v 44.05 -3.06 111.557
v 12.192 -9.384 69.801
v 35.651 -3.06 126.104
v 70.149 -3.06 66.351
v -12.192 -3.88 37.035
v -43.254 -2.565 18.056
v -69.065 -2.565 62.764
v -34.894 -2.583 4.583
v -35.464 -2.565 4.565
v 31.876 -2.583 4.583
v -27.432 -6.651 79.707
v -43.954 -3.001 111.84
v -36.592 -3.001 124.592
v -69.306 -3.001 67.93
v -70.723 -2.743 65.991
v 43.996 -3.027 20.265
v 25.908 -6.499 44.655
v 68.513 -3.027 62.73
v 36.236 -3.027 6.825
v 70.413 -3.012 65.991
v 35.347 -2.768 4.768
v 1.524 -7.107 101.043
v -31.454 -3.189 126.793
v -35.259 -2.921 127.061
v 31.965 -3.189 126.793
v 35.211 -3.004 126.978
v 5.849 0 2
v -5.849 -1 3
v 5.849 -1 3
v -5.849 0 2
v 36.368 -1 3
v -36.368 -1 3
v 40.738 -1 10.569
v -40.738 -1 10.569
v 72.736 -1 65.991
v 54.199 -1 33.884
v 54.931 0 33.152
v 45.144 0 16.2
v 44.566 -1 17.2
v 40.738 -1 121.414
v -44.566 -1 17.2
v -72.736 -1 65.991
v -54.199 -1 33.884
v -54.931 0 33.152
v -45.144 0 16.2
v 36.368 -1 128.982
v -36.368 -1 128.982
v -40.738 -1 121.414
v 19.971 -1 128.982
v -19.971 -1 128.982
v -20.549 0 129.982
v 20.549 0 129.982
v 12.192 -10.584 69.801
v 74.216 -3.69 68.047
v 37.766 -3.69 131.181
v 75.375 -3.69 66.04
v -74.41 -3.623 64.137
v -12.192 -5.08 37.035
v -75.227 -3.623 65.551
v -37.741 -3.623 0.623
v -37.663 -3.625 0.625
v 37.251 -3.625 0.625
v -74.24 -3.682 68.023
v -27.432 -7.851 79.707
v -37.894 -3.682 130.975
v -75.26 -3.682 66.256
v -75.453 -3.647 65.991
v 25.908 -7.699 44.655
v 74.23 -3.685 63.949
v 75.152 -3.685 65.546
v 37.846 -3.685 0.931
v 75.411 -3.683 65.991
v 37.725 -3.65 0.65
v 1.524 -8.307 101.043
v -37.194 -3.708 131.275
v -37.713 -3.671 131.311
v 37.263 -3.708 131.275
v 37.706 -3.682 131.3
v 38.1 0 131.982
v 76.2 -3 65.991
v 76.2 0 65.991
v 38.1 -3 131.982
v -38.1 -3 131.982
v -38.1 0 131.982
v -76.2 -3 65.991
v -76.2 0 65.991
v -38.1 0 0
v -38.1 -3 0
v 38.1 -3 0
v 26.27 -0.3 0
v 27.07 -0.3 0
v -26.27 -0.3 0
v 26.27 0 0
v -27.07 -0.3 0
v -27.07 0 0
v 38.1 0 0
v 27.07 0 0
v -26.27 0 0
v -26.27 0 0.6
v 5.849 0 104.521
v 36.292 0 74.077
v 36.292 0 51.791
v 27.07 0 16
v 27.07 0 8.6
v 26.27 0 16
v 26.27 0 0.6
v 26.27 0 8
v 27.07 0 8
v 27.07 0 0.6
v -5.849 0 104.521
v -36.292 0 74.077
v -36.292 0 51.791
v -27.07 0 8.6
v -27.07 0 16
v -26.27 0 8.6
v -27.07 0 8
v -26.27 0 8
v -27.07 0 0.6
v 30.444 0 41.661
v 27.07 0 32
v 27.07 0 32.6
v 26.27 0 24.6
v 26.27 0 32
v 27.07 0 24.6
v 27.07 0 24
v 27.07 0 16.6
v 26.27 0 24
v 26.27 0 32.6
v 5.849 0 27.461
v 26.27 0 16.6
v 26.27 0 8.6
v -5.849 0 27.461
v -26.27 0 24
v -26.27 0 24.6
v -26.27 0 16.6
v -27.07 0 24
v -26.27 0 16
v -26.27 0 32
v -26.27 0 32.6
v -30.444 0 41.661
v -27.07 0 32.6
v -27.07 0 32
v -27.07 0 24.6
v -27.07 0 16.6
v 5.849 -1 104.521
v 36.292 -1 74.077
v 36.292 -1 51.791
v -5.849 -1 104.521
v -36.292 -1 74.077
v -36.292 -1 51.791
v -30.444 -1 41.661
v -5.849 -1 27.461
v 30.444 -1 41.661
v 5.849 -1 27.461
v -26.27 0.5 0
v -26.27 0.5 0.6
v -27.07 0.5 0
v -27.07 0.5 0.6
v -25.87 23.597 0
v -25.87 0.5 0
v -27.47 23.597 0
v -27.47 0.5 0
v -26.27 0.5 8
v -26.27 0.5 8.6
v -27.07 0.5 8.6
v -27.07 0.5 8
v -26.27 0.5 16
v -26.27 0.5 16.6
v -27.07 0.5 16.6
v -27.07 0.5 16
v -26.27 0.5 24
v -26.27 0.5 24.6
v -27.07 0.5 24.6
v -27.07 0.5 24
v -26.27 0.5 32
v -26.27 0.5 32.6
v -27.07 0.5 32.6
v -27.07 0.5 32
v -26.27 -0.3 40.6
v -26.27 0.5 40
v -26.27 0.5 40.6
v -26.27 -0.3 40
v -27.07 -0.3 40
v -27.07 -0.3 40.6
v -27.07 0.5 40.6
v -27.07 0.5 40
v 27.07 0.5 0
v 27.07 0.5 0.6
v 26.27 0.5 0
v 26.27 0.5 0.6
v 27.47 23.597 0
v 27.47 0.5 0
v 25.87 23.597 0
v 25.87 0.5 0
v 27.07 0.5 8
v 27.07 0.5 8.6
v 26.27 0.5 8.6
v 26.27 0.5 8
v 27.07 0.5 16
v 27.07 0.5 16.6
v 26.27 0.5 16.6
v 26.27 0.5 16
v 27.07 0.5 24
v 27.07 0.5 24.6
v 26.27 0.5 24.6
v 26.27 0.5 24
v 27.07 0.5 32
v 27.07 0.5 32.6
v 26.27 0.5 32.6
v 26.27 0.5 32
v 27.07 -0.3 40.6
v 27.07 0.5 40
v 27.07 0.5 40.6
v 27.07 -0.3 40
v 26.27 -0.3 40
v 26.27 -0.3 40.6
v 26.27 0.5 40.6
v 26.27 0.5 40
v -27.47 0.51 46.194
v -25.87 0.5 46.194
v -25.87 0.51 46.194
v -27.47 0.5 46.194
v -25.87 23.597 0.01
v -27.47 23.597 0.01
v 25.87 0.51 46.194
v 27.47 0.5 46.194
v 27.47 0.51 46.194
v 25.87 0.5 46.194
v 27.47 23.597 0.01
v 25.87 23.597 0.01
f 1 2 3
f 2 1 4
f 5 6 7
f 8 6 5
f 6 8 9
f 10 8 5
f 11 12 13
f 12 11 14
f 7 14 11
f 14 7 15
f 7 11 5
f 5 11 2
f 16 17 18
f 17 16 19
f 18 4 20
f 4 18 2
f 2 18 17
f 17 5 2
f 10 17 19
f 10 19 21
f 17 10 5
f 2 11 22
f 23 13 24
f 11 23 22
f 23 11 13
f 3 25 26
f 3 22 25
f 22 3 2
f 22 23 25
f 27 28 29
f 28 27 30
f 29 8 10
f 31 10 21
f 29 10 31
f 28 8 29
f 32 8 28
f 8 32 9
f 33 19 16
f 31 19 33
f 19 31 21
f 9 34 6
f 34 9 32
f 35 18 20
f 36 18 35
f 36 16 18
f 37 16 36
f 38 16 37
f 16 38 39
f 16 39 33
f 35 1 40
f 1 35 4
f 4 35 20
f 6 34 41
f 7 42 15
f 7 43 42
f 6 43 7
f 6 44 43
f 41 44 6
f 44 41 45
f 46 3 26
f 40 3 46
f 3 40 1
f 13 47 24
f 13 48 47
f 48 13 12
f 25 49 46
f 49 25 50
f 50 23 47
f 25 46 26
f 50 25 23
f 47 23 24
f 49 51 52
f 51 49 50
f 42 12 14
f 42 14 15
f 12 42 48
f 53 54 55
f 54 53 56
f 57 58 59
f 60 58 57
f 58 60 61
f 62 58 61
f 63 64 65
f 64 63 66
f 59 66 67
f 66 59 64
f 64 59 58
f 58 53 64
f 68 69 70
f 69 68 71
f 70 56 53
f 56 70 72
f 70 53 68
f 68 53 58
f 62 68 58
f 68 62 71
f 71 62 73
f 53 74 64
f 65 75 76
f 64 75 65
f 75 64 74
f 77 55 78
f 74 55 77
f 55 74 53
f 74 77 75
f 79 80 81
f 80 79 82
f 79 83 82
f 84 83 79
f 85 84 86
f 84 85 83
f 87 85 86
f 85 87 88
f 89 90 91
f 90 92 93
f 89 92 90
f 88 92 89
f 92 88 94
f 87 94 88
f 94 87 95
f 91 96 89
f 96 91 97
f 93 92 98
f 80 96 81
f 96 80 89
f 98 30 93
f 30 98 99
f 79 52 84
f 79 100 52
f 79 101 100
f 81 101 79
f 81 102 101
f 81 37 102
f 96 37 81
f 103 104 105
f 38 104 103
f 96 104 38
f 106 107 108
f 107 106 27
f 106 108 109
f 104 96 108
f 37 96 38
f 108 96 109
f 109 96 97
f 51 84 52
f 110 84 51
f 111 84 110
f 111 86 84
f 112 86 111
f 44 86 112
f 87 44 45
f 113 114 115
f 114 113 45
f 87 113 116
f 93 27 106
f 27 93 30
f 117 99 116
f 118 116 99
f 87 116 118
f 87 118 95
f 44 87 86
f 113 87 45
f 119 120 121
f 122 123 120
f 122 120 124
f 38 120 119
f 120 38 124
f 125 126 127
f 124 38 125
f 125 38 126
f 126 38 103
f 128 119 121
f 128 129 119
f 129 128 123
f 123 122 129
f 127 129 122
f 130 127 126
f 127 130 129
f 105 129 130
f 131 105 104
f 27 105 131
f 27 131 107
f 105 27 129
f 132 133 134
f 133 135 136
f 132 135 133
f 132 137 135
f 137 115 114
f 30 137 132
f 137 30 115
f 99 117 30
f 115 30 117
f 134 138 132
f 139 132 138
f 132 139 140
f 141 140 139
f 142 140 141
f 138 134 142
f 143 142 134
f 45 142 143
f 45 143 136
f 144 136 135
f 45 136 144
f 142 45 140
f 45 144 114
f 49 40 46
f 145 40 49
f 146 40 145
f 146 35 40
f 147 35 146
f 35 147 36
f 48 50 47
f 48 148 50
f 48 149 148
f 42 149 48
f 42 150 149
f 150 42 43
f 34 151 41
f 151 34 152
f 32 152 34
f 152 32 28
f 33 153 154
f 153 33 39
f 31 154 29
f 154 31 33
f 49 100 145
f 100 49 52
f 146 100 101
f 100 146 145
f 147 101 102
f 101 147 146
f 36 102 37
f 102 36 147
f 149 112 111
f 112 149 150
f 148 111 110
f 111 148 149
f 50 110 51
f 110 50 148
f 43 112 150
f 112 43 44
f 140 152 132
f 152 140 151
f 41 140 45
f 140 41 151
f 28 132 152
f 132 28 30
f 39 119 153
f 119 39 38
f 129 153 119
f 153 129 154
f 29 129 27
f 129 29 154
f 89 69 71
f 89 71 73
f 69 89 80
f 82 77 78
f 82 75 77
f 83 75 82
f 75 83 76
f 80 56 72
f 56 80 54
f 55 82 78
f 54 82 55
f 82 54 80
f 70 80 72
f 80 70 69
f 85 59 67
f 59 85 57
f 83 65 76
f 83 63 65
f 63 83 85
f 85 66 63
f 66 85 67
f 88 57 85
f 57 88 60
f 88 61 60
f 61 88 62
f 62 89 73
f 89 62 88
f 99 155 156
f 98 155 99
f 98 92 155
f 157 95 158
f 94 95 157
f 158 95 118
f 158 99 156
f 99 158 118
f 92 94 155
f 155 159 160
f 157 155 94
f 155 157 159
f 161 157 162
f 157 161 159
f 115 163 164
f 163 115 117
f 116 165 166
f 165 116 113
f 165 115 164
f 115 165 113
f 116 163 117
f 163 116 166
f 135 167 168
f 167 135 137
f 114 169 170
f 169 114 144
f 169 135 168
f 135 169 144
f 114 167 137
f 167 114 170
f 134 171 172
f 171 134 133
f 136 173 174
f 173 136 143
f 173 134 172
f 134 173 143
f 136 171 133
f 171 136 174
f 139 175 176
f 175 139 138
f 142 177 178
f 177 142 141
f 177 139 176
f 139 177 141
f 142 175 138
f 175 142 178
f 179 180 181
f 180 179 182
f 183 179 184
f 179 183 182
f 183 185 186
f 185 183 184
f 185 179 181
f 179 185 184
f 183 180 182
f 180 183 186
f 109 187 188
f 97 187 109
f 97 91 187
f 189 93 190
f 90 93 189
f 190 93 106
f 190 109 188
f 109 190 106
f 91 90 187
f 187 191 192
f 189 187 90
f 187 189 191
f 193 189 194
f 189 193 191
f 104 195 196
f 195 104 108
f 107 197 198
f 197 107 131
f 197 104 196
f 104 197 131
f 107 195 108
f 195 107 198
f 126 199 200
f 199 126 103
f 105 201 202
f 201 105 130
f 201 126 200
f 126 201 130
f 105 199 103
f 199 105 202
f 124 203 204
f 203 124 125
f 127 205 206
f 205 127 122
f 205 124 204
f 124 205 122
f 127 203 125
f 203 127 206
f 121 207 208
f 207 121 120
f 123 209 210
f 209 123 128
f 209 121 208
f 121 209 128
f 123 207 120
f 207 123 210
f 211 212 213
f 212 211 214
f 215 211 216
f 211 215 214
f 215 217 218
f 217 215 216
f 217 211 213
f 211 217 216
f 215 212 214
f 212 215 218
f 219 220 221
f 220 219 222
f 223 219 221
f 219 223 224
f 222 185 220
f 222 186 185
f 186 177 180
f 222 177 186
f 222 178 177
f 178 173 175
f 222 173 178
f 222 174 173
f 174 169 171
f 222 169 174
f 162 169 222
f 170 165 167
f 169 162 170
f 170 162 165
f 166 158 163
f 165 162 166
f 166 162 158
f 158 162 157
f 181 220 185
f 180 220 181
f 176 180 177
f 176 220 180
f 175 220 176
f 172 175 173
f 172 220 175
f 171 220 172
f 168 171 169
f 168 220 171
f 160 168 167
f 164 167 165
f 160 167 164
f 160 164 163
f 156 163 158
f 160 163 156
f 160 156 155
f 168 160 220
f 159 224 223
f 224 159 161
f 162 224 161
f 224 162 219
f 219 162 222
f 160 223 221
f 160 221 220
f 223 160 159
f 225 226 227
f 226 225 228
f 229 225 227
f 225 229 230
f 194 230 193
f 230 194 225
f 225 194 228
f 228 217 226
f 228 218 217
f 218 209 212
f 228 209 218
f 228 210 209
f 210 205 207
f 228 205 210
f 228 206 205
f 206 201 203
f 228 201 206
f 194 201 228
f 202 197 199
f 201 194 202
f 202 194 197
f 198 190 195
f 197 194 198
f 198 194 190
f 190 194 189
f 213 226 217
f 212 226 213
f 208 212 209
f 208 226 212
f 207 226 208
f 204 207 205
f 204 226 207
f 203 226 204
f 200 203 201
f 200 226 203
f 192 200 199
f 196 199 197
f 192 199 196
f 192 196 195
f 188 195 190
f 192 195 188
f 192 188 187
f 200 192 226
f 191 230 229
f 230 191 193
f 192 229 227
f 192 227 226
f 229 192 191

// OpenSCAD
// Hexagon wall tile v36/v37 — parametric rebuild of v30
// Front: identical low-poly facets to v30 (same facet angles at every size).
// Edge profile: identical on every size (edge depth, rim width) so tiles butt flush.
// Back: six corner pads for 1" (25 mm) double-sided mounting tape.
// v32: tape pads are flat plates hung from the rim with an air gap to the front skin.
// v33: thinner skin + thinner pads so the air gap is 1.4 mm even right at the edges
//      (v32 had only 0.8 mm there and showed marks along the slanted edges).
// v34: snap-off stabilizer fins behind the bottom edge so the tall, thin tile can't tip over
//      while printing. Break them off afterwards (bend sideways) and the back stays flat.
// v35: 0.6 mm 45° chamfer on the front edge (crisp, consistent shadow line between tiles; hides
//      first-layer squish and brim trim marks) + relief_scale to deepen the facets if wanted.
// v37: much smaller breakaway tabs (0.8 x 0.6 mm, every 8 mm) so the fins snap off easily.
// Prints upright on a flat edge with NO supports (every downward edge is 45° or steeper).
//
// Export one size at a time, e.g.:
//   openscad -D size_in=6 -o hex_tile_v37_6in.stl hex_wall_tile_v37.scad

/* [Size] */
size_in       = 6;      // point-to-point width in inches (3, 6, 10 ...)

/* [Edge profile — keep identical across sizes] */
// Space behind the skin at the edge = edge_depth - skin; it must be >= pad_plate + pad_gap + pad_recess.
edge_depth    = 3.6;    // depth of the outer edge, back plane to front face (mm)
rim           = 2.0;    // perimeter wall thickness at the back plane (mm)
front_chamfer = 0.6;    // 45° chamfer on the front edge (mm); 0 = sharp edge

/* [Look] */
relief_scale  = 1.0;    // 1.0 = v30 facets; 1.5 = 50% deeper facets (same edge profile on all sizes)

/* [Front skin] */
skin          = 1.2;    // front skin thickness (mm) — 3 lines at 0.4 mm, same on all sizes

/* [Tape pads] */
tape_width    = 25.4;   // tape width (mm)
pad_margin    = 3;      // extra pad width beyond the tape (mm)
pad_max_frac  = 0.45;   // pad never larger than this fraction of the tile radius (keeps 3" usable)
pad_plate     = 1.0;    // thickness of the pad plates (mm)
pad_gap       = 1.4;    // minimum air gap between pads and the front skin (mm) — keeps the front clean
pad_recess    = 0;      // pads set back from the rim (mm); >0 lets the rim touch the wall,
                        // but near the edges the plate is then trimmed thinner to keep pad_gap

/* [Print stabilizers (snap off after printing)] */
stabilizers   = true;
fin_count     = 2;      // fins behind the bottom edge, placed symmetrically
fin_thick     = 1.6;    // fin thickness (mm)
fin_height_frac = 0.35; // fin height as a fraction of the tile height
fin_depth_frac  = 0.5;  // fin depth behind the tile as a fraction of fin height
fin_depth_min   = 15;   // (mm)
fin_gap       = 0.5;    // air gap between fin and tile back (mm)
tab_height    = 0.6;    // breakaway tab height (mm, vertical when printing) — 3 layers at 0.2
tab_width     = 0.8;    // breakaway tab width (mm), centred on the fin — 2 lines
tab_pitch     = 8;      // spacing between tabs (mm)

/* [Output] */
orient_for_print = true; // stand upright on a flat edge, back facing +Y

/* [Hidden] */
R   = size_in * 25.4 / 2;         // corner radius
AP  = R * cos(30);                // apothem
PAD = min(tape_width + pad_margin, R * pad_max_frac);

// Normalised front geometry from v30 (x, y in units of R; z = relief above edge, units of R)
FP = [[1,0,0],[0.5,0.866025,0],[-0.5,0.866025,0],[-1,0,0],[-0.5,-0.866025,0],[0.5,-0.866025,0],
      [0.16,0.05,0.091654],[-0.16,-0.38,0.019428],[-0.36,0.18,0.05579],[0.34,-0.28,0.053795],[0.02,0.46,0.061766]];
FACES = [[0,6,1],[4,3,7],[5,4,7],[8,3,2],[7,3,8],[7,8,6],[5,9,0],[9,6,0],[9,7,6],[5,7,9],
         [6,8,10],[8,2,10],[6,10,1],[10,2,1],
         [1,12,11,0],[2,13,12,1],[3,14,13,2],[4,15,14,3],[5,16,15,4],[0,11,16,5],
         [11,12,13,14,15,16]];
RELIEF_MAX = 0.091654 * R * relief_scale;
D = edge_depth + RELIEF_MAX + 1;  // max depth used for chamfers

// Solid bounded by the faceted front (shifted by dz) and a flat back at z = zb
module body(dz = 0, zb = 0) {
    pts = concat(
        [for (p = FP) [p[0]*R, p[1]*R, edge_depth + p[2]*R*relief_scale + dz]],
        [for (i = [0:5]) [FP[i][0]*R, FP[i][1]*R, zb]]);
    polyhedron(points = pts, faces = FACES, convexity = 4);
}

module hex2d(apothem) { circle(r = apothem / cos(30), $fn = 6); }

// Back cavity: behind the skin, inside the rim; rim inner faces slope 45° so nothing needs support
module cavity(extra = 0) {
    H  = D + 2;
    a0 = AP - rim - extra + 1;             // apothem at z = -1
    intersection() {
        body(dz = -skin - extra, zb = -1);
        translate([0, 0, -1]) linear_extrude(height = H, scale = (a0 - H) / a0) hex2d(a0);
    }
}

// Corner pad footprint (2D), k = corner index 0..5:
// the corner region of the inner hex, PAD wide, long enough to hold a PAD x PAD square of tape
module pad_core(k) {
    U0  = (AP - rim) / cos(30);                    // inner corner distance from centre
    LEN = PAD / (2 * tan(60)) + PAD + 1;           // apex taper + full square + margin
    intersection() {
        hex2d(AP - rim + 0.3);                     // overlap 0.3 mm into the rim to fuse
        rotate(60 * k) translate([U0 - LEN, -PAD / 2]) square([LEN + 5, PAD]);
    }
}

// In-plane self-support: printed upright, a vertical plate needs every downward edge at >= 45°.
// Sweep each pad toward the nearest rim side below it at 45° (or straight down for bottom corners).
SWEEP = [[1, -1], [1, -1], [-1, -1], [-1, -1], [0, -1], [0, -1]];
module pad_fp(k) {
    intersection() {
        hex2d(AP - rim + 0.3);
        hull() { pad_core(k); translate(SWEEP[k] * R) pad_core(k); }
    }
}

module pads() {
    intersection() {
        body(dz = -skin - pad_gap, zb = -1);       // never closer than pad_gap to the skin
        translate([0, 0, pad_recess]) linear_extrude(pad_plate) for (k = [0:5]) pad_fp(k);
    }
}

module chamfer_clip() {
    HB = D + 5;
    union() {
        translate([0, 0, -2]) linear_extrude(edge_depth - front_chamfer + 2) hex2d(AP + 1);
        translate([0, 0, edge_depth - front_chamfer]) linear_extrude(height = HB, scale = (AP - HB) / AP) hex2d(AP);
    }
}

module tile() {
    intersection() {
        union() {
            difference() { body(); cavity(); }
            pads();
        }
        if (front_chamfer > 0) chamfer_clip(); else translate([-2*R, -2*R, -5]) cube([4*R, 4*R, 4*R]);
    }
}

// Triangular fins standing on the bed behind the back (model z < 0), joined to the tile by small tabs
FIN_H = fin_height_frac * 2 * AP;
FIN_L = max(fin_depth_min, fin_depth_frac * FIN_H);
function fin_x(i) = (fin_count == 1) ? 0 : (-1 + 2 * i / (fin_count - 1)) * 0.35 * R;
module stabilizer_fins() {
    for (i = [0 : fin_count - 1]) {
        x = fin_x(i);
        hull() {                                            // fin: vertical triangle
            translate([x - fin_thick/2, -AP, -fin_gap - FIN_L]) cube([fin_thick, 0.01, FIN_L]);
            translate([x - fin_thick/2, -AP, -fin_gap - 0.01]) cube([fin_thick, FIN_H, 0.01]);
        }
        for (y = [0 : tab_pitch : FIN_H - tab_height])      // breakaway tabs into the back plane
            translate([x - tab_width/2, -AP + y, -fin_gap - 0.05]) cube([tab_width, tab_height, fin_gap + 0.35]);
    }
}

if (orient_for_print)
    translate([0, 0, AP]) rotate([90, 0, 0]) { tile(); if (stabilizers) stabilizer_fins(); }
else
    { tile(); if (stabilizers) stabilizer_fins(); }
